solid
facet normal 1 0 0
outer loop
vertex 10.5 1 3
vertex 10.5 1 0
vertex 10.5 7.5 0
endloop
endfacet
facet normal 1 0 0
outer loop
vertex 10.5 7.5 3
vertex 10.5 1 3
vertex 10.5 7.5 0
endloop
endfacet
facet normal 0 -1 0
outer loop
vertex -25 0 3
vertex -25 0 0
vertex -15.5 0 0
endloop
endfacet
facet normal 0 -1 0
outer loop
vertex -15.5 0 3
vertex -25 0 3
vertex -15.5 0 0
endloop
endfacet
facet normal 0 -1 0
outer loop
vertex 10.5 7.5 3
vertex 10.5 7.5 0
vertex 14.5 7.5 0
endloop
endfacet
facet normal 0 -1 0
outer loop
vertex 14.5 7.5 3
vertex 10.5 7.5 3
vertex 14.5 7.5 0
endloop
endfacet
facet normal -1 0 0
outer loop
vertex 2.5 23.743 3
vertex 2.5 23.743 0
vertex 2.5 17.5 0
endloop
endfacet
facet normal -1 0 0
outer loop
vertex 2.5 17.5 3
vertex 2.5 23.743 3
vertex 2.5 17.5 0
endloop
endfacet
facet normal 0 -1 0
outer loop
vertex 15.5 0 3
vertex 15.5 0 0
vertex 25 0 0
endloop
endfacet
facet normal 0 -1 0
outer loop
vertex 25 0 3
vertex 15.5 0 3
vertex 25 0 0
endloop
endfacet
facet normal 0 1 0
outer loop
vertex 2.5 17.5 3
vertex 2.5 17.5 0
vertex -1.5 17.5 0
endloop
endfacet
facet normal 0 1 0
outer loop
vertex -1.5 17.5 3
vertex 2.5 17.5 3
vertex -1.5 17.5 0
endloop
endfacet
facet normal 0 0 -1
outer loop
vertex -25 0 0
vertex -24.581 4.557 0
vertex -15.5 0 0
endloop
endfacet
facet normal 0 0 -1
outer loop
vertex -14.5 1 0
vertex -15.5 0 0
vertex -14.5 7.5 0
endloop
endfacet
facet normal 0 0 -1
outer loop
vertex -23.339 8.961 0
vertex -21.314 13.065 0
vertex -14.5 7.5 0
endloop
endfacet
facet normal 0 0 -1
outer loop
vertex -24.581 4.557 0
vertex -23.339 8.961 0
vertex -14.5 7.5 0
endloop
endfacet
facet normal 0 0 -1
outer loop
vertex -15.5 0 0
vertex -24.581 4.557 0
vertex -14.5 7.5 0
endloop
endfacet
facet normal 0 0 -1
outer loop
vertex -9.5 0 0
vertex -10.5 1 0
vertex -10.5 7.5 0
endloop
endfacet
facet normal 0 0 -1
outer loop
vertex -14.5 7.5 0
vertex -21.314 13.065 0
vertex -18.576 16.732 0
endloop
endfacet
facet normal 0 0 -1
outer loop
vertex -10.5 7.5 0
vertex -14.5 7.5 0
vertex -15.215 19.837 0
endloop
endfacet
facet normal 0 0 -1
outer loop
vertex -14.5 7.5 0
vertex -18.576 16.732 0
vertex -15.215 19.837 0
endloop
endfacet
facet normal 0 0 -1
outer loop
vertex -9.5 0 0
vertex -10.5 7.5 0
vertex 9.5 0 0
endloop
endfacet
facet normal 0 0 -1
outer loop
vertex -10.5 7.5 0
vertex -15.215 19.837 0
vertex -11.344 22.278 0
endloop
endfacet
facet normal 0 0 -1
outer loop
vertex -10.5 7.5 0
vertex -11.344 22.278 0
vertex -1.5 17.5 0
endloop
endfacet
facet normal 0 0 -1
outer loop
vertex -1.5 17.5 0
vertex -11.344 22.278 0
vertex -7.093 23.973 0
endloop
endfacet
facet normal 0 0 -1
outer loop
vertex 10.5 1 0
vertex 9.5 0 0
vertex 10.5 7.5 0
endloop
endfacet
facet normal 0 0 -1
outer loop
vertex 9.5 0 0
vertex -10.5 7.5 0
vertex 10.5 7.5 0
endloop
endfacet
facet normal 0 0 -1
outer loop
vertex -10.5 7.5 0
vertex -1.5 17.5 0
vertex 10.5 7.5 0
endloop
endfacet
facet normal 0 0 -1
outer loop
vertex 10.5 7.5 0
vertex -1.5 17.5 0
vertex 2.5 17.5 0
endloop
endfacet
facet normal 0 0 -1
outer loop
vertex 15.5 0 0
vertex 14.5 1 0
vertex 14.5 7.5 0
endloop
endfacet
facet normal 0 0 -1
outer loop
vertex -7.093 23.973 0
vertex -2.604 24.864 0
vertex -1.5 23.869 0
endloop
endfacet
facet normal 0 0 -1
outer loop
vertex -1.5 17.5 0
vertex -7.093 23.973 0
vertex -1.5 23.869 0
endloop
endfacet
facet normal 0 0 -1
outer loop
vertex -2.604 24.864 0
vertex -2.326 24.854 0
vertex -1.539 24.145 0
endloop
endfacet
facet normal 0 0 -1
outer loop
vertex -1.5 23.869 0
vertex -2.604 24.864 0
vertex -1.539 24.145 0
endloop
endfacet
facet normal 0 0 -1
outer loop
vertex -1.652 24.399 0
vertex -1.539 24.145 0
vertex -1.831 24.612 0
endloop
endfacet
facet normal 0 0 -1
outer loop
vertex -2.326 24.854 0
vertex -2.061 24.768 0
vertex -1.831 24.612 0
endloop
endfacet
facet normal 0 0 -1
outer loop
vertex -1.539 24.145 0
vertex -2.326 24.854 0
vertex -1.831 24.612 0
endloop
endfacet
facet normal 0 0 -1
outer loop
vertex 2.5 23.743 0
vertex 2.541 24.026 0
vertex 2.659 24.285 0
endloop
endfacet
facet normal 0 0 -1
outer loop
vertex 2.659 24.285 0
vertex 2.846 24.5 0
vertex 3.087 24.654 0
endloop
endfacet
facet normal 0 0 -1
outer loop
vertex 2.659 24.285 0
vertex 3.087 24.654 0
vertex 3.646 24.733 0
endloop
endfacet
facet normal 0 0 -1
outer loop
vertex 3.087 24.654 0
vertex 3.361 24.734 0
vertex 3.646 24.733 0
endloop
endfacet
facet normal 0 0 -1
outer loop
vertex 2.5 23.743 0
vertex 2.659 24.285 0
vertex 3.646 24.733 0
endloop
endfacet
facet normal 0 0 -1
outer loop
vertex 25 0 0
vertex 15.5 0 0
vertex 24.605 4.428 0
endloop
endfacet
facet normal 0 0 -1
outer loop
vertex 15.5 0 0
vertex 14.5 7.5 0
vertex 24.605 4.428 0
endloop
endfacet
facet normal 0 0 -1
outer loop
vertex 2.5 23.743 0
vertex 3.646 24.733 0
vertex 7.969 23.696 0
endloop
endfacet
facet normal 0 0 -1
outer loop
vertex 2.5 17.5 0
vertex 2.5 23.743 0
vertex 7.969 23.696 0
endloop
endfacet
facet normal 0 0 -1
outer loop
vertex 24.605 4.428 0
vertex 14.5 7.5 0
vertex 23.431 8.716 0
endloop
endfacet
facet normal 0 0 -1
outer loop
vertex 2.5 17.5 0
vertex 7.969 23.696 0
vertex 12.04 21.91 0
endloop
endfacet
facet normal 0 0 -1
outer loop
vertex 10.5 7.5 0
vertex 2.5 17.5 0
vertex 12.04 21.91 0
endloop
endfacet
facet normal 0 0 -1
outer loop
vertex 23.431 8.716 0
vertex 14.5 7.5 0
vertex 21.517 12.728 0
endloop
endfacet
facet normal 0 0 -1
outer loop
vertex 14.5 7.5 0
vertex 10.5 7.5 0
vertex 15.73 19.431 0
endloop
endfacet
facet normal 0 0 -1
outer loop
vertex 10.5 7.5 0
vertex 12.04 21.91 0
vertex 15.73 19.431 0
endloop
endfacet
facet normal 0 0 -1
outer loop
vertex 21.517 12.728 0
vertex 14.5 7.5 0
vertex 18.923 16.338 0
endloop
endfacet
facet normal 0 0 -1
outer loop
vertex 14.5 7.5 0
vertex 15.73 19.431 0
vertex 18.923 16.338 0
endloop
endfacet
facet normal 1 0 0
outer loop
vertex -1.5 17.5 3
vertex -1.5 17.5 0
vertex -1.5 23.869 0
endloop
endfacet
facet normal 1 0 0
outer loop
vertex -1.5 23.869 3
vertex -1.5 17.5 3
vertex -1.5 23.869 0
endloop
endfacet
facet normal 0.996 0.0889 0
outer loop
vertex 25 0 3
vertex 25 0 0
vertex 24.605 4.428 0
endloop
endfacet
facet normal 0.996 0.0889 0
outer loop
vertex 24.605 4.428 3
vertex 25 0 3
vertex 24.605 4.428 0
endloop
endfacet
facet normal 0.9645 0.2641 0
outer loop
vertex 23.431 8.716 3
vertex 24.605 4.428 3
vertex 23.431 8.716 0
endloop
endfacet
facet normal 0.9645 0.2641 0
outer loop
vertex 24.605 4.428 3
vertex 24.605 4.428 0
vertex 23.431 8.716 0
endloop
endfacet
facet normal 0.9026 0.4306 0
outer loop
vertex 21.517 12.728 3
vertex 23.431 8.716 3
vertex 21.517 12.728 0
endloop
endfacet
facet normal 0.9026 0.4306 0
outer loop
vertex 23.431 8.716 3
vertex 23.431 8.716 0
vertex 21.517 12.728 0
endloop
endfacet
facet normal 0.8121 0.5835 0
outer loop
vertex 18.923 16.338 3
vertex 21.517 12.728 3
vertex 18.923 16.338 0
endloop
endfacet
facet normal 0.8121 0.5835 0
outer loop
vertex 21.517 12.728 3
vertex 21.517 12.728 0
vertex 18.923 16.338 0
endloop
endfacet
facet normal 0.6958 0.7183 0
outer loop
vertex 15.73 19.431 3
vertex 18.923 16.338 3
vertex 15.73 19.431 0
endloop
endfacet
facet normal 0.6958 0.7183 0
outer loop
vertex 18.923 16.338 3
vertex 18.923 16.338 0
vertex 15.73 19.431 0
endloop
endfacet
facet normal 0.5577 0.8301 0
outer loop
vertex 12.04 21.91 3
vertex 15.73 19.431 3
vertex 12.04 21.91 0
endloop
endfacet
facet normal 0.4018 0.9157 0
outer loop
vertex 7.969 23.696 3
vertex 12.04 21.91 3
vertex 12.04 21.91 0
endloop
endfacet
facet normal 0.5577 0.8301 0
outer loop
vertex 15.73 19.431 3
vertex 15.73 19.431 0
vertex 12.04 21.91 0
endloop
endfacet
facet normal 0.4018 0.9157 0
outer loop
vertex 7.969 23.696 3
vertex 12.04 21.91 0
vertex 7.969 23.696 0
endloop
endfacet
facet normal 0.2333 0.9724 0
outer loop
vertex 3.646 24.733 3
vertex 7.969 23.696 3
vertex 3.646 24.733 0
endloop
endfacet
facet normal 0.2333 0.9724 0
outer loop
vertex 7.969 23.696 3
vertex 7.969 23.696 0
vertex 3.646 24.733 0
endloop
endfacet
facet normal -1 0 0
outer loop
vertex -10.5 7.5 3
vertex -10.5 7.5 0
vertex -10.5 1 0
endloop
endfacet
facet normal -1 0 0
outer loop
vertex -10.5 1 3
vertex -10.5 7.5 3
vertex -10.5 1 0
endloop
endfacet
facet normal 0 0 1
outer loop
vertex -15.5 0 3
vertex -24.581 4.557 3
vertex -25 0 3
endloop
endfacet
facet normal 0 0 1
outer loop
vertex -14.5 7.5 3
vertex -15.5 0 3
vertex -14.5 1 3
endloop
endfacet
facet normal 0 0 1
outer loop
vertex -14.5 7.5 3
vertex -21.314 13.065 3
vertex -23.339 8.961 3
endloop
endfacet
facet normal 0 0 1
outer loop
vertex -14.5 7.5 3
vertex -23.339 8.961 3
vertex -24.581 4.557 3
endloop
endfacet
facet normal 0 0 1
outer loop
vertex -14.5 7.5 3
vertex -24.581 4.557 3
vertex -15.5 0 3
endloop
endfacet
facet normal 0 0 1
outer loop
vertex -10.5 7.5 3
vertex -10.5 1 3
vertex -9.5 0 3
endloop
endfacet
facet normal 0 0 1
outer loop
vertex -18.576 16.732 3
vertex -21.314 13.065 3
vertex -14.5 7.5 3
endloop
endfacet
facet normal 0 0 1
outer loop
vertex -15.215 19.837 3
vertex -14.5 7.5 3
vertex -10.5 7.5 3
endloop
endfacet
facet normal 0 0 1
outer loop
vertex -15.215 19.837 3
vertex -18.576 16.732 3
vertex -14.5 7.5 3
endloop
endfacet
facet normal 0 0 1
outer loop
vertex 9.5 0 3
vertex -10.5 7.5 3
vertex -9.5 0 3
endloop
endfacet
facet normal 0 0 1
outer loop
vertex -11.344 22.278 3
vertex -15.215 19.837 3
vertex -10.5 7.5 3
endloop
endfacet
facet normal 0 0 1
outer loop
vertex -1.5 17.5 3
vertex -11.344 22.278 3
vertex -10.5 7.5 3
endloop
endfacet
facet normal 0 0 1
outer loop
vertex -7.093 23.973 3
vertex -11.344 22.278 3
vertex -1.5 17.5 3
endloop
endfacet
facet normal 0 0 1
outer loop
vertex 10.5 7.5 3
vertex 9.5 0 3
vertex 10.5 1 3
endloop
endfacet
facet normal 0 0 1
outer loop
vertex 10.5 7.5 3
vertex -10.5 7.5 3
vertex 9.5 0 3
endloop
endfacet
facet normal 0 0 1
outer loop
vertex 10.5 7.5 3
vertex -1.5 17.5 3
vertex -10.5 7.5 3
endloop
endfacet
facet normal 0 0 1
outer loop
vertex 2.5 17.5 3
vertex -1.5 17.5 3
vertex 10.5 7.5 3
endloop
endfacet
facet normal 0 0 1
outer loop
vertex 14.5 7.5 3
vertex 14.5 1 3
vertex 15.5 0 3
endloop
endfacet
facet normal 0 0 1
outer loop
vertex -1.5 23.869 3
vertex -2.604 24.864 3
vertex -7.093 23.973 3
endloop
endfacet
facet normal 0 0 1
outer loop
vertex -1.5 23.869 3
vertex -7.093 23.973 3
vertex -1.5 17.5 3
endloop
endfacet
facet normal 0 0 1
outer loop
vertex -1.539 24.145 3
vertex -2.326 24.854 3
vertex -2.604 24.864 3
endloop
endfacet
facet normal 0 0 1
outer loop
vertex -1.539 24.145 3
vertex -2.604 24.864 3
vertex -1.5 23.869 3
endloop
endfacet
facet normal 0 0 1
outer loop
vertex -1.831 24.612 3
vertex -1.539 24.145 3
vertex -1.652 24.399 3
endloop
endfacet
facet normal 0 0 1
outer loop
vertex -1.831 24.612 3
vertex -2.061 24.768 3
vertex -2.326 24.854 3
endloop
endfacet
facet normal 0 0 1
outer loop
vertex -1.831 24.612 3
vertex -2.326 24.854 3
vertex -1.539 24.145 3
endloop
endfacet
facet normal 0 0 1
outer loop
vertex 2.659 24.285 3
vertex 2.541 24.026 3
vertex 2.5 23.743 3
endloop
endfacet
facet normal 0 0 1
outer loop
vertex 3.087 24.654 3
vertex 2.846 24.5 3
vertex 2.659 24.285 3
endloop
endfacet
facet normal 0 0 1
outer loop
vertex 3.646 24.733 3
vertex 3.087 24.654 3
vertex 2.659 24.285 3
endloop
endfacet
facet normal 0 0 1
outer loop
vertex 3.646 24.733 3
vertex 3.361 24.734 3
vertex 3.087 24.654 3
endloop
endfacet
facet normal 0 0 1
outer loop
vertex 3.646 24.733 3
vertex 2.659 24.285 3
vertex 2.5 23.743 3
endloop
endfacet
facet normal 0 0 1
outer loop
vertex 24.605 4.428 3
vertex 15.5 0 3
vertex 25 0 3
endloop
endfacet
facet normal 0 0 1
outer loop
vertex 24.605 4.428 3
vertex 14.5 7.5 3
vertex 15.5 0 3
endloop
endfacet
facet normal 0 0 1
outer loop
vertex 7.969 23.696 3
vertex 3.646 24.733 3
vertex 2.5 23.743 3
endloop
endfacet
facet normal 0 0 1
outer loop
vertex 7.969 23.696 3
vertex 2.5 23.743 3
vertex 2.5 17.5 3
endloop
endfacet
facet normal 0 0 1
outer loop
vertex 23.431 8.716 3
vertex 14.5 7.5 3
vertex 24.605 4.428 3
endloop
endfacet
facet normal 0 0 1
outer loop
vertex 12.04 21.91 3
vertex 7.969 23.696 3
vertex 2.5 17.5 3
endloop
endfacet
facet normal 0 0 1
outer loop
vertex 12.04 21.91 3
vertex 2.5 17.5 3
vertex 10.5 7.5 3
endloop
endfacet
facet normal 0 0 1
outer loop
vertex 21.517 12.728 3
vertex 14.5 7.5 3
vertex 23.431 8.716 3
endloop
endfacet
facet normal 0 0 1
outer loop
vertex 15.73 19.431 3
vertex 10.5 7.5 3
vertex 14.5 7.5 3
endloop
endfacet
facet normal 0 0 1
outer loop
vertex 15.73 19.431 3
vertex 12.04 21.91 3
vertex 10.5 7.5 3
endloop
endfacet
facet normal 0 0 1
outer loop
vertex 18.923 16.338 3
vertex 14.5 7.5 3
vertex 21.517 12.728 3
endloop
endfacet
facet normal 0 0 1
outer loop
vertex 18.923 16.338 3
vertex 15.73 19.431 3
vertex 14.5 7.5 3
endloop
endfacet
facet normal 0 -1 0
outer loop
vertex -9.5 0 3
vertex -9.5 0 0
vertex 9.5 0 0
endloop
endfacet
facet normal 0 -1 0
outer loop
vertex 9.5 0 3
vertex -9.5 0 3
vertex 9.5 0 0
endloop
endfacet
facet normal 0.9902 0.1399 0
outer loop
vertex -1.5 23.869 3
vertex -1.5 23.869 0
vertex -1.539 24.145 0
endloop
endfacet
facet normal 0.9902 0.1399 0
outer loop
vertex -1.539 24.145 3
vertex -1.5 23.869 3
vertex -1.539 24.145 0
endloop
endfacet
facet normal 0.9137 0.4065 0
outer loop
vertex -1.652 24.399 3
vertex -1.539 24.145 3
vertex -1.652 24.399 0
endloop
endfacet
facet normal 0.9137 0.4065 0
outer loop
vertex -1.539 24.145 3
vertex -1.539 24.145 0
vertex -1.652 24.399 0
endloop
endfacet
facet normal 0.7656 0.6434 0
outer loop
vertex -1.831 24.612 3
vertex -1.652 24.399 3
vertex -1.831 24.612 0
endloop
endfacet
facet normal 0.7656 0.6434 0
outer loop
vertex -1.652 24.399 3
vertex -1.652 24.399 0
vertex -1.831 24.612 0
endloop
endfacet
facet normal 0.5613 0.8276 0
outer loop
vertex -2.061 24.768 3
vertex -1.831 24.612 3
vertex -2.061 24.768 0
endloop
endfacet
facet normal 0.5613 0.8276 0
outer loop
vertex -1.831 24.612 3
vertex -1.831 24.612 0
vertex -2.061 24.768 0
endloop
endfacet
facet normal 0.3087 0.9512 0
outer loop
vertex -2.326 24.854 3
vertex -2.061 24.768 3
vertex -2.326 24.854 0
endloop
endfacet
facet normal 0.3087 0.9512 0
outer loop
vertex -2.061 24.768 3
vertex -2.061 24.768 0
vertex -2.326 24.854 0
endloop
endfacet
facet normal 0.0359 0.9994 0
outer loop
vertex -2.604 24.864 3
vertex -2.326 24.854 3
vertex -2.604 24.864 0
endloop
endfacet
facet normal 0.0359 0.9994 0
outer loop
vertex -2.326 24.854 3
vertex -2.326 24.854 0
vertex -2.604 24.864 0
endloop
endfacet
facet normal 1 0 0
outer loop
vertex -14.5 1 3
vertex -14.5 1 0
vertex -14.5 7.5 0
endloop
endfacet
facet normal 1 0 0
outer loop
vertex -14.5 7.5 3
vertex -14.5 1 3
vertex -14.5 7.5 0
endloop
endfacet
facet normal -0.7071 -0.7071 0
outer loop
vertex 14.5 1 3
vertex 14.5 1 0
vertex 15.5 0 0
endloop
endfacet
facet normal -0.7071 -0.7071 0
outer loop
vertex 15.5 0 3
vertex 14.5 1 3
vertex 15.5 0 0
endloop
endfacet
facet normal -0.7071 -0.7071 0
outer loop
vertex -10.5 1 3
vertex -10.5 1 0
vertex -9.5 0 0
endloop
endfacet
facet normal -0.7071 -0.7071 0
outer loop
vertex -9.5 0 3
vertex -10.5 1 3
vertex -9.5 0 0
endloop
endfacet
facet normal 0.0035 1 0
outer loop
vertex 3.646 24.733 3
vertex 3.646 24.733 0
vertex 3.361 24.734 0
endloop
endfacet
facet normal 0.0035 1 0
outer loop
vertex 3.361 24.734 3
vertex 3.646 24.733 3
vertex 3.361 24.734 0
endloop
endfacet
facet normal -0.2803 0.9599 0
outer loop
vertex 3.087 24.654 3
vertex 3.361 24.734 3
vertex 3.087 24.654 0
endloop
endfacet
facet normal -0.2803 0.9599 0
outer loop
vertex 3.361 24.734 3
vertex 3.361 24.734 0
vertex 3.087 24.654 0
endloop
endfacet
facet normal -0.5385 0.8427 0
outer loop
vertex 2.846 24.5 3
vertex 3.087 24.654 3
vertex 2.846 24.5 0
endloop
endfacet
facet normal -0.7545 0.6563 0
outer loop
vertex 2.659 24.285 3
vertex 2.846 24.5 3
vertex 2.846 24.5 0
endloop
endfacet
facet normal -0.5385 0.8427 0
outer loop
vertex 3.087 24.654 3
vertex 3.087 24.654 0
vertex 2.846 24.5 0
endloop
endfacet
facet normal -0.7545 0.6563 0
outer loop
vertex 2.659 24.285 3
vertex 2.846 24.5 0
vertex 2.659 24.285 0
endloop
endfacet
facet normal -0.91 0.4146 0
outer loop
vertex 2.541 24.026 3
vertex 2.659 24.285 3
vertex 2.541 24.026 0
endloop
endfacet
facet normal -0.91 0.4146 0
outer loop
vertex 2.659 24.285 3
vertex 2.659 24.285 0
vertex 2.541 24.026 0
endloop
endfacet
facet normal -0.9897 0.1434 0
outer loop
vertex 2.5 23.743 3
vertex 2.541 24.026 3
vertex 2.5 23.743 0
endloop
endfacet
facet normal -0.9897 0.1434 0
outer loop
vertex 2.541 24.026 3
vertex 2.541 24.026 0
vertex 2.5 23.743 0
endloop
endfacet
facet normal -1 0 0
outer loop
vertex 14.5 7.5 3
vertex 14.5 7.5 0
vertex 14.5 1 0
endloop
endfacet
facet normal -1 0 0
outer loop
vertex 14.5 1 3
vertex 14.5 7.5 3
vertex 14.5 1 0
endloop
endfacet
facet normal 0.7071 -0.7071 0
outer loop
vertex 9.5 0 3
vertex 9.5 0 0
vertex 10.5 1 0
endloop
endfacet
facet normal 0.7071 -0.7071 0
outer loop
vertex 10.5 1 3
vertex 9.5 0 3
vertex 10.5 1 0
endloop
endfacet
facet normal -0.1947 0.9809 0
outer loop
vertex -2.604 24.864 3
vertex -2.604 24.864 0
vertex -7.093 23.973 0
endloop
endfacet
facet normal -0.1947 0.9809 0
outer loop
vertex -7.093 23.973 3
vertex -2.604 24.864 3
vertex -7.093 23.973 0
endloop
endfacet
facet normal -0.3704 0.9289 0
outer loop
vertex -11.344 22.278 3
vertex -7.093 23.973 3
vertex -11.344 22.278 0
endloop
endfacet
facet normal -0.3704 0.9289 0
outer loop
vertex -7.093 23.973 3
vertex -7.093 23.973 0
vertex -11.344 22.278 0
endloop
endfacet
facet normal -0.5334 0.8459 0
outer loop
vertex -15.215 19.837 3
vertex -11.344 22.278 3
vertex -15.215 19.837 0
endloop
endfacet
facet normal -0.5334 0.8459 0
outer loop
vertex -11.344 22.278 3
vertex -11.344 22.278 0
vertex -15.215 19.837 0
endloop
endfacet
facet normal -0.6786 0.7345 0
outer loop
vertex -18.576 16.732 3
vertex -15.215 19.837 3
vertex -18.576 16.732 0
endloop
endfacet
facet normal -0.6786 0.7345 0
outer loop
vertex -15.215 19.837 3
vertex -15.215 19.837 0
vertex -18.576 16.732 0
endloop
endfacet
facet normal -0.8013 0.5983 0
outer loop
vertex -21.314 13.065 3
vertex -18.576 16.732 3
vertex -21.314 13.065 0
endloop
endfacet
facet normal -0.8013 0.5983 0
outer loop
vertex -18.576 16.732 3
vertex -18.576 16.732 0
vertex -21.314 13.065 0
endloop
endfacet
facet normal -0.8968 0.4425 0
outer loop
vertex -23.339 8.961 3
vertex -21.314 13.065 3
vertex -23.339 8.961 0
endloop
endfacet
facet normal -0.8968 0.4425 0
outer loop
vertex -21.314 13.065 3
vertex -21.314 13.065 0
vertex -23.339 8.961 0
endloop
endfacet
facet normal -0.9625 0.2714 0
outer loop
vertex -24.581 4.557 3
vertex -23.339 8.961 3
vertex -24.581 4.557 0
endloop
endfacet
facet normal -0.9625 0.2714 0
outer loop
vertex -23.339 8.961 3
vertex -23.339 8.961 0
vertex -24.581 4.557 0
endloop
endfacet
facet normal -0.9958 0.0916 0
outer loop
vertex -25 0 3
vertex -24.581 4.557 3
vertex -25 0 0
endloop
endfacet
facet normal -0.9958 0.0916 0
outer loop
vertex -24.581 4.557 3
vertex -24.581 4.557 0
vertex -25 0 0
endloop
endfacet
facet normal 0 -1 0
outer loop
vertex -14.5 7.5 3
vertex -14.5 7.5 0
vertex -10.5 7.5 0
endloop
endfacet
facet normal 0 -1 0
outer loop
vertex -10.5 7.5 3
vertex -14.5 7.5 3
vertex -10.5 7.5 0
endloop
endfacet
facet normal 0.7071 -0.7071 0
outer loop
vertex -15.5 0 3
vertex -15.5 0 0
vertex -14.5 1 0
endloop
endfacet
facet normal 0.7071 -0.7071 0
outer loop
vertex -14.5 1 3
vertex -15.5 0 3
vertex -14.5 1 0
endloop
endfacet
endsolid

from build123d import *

# Parameters (mm, degrees)
BOSS_EXTRUDE1_DEPTH = 3


with BuildPart() as part:
    # Sketch1 → Boss-Extrude1 (new body)
    with BuildSketch(Plane.XY):
        with BuildLine():
            Line((-25, 0), (-15.5, 0))
            Line((-15.5, 0), (-14.5, 1))
            Line((-14.5, 1), (-14.5, 7.5))
            Line((-14.5, 7.5), (-10.5, 7.5))
            Line((-10.5, 7.5), (-10.5, 1))
            Line((-10.5, 1), (-9.5, 0))
            Line((-9.5, 0), (9.5, 0))
            Line((9.5, 0), (10.5, 1))
            Line((10.5, 1), (10.5, 7.5))
            Line((10.5, 7.5), (14.5, 7.5))
            Line((14.5, 7.5), (14.5, 1))
            Line((14.5, 1), (15.5, 0))
            Line((15.5, 0), (25, 0))
            ThreePointArc((25, 0), (18.922814713, 16.337903272), (3.645833333, 24.732729314))
            ThreePointArc((3.645833333, 24.732729314), (2.846483869, 24.50033273), (2.5, 23.743420141))
            Line((2.5, 23.743420141), (2.5, 17.5))
            Line((2.5, 17.5), (-1.5, 17.5))
            Line((-1.5, 17.5), (-1.5, 23.869436525))
            ThreePointArc((-1.5, 23.869436525), (-1.830734233, 24.612459629), (-2.604166667, 24.86399638))
            ThreePointArc((-2.604166667, 24.86399638), (-18.575577604, 16.731644171), (-25, 0))
        make_face()
    extrude(amount=BOSS_EXTRUDE1_DEPTH)


solid = part.part
